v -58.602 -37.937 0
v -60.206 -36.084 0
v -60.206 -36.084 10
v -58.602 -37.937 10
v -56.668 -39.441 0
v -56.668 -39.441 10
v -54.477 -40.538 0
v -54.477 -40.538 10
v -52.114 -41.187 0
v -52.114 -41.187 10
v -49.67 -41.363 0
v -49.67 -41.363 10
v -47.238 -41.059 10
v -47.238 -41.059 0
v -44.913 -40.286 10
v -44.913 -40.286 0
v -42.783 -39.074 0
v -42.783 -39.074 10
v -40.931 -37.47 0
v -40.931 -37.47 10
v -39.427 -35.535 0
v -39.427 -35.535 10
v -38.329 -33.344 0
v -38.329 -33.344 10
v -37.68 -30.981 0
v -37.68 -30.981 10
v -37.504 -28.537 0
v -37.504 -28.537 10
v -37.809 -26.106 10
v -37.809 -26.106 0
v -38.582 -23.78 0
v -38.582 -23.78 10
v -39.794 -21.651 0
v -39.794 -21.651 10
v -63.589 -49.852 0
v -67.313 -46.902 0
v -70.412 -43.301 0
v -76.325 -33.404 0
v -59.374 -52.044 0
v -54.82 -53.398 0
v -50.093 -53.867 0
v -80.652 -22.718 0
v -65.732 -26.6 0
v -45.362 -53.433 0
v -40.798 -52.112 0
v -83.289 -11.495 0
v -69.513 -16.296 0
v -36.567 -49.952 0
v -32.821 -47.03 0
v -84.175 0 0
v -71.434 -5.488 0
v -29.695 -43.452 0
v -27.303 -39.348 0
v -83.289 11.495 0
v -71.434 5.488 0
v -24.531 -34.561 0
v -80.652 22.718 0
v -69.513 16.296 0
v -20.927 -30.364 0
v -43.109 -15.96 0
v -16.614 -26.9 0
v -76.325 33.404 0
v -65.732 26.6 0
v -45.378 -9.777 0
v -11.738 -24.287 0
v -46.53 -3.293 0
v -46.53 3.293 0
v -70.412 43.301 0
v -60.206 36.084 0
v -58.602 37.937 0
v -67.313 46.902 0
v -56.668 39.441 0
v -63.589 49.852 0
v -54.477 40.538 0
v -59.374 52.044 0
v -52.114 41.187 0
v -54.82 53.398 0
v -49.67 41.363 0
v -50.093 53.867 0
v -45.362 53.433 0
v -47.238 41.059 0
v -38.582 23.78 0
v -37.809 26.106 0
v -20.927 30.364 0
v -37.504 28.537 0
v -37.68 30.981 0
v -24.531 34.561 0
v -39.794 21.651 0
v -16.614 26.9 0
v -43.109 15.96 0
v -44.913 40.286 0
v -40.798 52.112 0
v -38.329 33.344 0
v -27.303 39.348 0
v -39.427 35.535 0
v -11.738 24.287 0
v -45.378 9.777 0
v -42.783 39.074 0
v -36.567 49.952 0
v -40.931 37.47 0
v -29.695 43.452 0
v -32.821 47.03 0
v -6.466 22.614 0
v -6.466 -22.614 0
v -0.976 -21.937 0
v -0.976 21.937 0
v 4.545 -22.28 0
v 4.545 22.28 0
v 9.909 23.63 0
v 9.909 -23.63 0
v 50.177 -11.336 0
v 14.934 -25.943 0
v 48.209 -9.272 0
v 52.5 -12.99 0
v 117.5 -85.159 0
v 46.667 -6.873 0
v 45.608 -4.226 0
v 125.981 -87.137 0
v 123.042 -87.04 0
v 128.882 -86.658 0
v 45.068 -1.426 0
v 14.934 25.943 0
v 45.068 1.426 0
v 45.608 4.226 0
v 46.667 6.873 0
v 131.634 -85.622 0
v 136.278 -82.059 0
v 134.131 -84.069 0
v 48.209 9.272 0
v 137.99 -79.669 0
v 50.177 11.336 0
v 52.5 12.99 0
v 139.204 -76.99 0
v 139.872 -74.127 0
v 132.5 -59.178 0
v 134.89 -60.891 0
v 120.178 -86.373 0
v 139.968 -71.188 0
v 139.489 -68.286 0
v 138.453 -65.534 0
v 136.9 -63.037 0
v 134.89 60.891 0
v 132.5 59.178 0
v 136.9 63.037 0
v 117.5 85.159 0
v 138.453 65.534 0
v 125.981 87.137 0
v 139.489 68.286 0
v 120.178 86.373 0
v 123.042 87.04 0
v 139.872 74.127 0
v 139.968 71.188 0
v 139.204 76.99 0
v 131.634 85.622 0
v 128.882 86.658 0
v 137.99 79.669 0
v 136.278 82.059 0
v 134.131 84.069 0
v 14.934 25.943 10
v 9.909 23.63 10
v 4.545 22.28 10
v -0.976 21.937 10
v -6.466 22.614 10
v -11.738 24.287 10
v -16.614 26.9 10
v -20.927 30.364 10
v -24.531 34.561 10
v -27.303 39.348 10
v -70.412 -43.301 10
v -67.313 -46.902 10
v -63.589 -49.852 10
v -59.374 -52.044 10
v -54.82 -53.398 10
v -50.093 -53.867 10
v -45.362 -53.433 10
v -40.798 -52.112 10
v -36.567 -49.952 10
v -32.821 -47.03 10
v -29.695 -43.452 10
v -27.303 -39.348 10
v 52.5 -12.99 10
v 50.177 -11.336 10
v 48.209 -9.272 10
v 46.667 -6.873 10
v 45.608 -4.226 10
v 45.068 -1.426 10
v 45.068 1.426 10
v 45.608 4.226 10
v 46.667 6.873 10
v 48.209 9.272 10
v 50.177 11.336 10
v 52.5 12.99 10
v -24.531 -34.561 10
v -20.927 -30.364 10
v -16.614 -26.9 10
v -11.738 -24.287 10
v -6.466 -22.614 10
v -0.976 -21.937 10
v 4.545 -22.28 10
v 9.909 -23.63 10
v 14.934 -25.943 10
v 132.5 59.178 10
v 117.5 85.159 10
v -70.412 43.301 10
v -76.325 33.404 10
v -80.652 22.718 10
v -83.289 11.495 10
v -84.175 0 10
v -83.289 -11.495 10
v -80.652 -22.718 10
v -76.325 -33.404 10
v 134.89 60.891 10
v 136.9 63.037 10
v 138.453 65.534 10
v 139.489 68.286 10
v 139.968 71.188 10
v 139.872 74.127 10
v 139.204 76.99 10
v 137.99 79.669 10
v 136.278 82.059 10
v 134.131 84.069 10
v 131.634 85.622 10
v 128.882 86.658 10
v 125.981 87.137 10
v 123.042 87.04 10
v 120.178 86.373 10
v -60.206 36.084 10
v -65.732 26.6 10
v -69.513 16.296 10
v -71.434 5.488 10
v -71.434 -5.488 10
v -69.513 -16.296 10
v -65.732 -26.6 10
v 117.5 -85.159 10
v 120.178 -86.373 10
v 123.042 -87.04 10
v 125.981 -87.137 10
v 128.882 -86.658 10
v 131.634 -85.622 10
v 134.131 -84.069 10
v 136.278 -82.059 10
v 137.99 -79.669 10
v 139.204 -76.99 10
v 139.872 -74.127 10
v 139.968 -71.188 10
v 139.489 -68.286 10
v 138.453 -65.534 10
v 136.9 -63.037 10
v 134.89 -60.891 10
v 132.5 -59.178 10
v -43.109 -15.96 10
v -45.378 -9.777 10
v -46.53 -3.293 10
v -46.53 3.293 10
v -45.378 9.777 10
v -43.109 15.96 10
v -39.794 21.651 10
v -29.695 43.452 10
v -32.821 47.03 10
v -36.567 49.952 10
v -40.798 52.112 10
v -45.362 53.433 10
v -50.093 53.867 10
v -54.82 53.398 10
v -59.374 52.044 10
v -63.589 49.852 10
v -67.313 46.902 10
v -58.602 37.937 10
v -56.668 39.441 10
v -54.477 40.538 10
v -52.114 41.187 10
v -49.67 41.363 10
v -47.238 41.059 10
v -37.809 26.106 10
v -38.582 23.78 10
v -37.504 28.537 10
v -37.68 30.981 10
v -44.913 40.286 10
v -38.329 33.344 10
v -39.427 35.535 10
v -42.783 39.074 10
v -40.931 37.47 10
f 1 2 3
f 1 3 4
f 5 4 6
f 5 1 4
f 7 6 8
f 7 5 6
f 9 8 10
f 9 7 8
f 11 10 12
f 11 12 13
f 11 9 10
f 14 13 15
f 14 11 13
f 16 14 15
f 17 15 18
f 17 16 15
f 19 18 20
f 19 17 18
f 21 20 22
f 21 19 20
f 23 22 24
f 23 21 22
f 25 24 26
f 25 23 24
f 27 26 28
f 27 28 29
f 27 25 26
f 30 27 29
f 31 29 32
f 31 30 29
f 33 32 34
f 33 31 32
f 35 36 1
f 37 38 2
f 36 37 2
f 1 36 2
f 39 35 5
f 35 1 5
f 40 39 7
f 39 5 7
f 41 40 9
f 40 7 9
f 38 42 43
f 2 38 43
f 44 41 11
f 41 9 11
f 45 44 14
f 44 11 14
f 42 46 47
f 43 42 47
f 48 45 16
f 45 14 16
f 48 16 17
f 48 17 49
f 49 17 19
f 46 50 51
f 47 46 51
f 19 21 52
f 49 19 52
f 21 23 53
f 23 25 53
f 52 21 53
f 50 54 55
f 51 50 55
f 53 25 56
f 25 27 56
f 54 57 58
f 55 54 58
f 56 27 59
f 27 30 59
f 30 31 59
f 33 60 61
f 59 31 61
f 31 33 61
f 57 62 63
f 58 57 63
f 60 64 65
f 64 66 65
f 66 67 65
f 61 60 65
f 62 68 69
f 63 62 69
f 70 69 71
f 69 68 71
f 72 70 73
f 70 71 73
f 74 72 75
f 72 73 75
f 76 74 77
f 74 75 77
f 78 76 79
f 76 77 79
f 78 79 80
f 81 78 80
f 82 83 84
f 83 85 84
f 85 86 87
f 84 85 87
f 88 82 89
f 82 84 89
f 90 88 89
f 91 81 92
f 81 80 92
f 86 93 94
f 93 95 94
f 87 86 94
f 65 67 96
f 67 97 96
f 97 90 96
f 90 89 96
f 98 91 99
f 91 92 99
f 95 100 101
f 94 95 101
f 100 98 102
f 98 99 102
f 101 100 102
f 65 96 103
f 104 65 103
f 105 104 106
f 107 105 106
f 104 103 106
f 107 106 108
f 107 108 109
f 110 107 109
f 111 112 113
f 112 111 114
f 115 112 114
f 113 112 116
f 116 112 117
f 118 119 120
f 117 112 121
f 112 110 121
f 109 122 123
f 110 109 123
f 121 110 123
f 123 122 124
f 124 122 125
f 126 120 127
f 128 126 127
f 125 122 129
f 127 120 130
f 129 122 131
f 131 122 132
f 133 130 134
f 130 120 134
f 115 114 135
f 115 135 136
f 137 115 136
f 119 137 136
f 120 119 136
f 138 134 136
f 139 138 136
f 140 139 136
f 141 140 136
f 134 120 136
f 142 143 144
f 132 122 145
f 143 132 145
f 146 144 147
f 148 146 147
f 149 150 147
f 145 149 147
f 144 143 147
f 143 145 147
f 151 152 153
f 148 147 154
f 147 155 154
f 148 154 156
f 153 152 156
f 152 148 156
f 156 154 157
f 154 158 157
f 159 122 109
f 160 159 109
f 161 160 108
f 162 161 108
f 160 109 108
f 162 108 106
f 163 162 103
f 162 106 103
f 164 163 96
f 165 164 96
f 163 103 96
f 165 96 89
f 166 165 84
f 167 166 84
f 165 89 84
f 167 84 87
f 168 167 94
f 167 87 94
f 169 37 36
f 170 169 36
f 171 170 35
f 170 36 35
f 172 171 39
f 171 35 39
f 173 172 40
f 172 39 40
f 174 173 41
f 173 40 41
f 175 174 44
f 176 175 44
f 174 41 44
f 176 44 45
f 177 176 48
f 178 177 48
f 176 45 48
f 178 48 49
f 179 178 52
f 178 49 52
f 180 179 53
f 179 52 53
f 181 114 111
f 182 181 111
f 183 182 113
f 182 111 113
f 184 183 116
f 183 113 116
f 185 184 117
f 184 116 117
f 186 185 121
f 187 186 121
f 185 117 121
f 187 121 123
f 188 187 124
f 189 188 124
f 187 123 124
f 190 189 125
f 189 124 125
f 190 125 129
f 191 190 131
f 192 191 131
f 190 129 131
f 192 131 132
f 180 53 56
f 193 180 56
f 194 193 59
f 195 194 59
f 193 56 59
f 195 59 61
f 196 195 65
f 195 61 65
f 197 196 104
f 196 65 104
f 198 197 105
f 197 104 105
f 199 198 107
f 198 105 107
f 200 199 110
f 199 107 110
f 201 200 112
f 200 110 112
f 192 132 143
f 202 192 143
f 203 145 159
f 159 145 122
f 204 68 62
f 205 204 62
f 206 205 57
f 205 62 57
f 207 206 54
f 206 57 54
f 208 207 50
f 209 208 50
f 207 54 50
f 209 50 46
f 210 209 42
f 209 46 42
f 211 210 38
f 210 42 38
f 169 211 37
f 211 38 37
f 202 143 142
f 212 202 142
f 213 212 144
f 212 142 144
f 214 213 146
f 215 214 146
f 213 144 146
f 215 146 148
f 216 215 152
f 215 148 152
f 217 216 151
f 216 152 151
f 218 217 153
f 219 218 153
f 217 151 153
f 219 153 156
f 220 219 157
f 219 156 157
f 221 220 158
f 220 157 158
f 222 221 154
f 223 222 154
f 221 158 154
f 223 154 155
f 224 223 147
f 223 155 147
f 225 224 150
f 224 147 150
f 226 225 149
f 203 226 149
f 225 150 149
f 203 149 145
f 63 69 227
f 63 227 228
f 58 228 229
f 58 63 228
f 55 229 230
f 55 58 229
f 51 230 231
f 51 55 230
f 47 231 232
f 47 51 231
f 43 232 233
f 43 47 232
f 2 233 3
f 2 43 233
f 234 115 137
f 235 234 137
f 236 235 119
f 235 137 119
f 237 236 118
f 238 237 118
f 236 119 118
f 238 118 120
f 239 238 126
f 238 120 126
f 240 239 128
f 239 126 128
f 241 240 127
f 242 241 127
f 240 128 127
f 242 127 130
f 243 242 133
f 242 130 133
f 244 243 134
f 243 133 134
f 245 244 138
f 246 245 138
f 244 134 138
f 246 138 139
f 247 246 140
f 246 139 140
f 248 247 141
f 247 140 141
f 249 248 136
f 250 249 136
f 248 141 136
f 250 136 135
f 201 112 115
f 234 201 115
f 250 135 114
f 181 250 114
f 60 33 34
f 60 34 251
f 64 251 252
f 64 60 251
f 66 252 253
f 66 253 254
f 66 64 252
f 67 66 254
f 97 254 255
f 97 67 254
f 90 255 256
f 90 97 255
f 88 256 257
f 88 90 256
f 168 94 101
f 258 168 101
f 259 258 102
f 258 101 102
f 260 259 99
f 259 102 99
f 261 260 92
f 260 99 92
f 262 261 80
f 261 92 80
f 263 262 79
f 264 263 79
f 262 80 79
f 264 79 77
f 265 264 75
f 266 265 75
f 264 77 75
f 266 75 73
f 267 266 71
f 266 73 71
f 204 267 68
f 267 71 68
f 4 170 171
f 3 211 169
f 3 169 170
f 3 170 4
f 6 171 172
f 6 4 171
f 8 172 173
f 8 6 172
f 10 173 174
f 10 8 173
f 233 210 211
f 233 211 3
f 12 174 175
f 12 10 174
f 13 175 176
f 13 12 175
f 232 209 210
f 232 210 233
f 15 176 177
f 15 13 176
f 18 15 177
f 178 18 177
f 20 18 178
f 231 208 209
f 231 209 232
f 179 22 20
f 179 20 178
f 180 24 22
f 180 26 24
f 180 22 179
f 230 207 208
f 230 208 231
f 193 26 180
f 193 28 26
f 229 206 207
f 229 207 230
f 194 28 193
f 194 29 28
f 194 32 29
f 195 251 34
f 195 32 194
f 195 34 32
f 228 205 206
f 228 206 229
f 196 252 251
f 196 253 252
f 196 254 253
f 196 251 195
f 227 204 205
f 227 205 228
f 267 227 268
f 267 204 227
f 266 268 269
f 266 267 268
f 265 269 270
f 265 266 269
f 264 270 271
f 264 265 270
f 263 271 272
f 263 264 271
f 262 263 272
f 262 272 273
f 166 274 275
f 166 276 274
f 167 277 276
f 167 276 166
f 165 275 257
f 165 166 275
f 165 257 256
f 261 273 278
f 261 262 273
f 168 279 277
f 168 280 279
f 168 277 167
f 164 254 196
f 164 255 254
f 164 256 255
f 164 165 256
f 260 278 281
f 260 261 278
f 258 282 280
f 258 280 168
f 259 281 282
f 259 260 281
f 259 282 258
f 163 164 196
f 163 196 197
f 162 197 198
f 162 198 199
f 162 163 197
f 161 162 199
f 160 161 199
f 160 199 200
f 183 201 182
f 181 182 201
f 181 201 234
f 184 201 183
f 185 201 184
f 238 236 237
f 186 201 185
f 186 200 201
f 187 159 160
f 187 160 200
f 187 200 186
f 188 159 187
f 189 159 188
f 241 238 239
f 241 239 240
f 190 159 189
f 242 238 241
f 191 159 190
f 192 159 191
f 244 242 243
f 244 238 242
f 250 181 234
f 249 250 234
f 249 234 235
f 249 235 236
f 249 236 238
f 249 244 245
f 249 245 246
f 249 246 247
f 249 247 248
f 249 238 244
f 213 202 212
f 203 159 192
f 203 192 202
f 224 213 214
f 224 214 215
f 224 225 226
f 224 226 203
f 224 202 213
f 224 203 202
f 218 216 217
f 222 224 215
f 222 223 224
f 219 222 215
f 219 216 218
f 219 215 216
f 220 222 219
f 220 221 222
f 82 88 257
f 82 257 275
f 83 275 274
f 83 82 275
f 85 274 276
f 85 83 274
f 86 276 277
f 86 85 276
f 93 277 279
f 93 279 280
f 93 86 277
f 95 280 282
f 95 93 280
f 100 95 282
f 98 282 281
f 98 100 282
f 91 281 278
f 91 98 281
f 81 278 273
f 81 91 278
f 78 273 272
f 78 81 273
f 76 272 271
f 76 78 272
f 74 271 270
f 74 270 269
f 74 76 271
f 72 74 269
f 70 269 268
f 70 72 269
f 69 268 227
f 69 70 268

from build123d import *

# Parameters (mm, degrees)
SALIENTE_EXTRUIR2_DEPTH = 10


with BuildPart() as part:
    # Croquis1 → Saliente-Extruir2 (new body)
    with BuildSketch(Plane.XY):
        with BuildLine():
            Line((117.5, 85.159164705), (14.934164903, 25.942752202))
            ThreePointArc((14.934164903, 25.942752202), (-9.140901633, 23.329053884), (-27.302652317, 39.347513849))
            ThreePointArc((-27.302652317, 39.347513849), (-47.71673979, 53.763029578), (-70.412414523, 43.301270189))
            ThreePointArc((-70.412414523, 43.301270189), (-84.175170954, 0), (-70.412414523, -43.301270189))
            ThreePointArc((-70.412414523, -43.301270189), (-47.71673979, -53.763029578), (-27.302652317, -39.347513849))
            ThreePointArc((-27.302652317, -39.347513849), (-9.140901633, -23.329053884), (14.934164903, -25.942752202))
            Line((14.934164903, -25.942752202), (117.5, -85.159164705))
            ThreePointArc((117.5, -85.159164705), (137.990381057, -79.668783649), (132.5, -59.178402592))
            Line((132.5, -59.178402592), (52.5, -12.990381057))
            ThreePointArc((52.5, -12.990381057), (45, 0), (52.5, 12.990381057))
            Line((52.5, 12.990381057), (132.5, 59.178402592))
            ThreePointArc((132.5, 59.178402592), (137.990381057, 79.668783649), (117.5, 85.159164705))
        make_face()
        with BuildLine():
            ThreePointArc((-60.206207262, 36.084391824), (-71.675170954, 0), (-60.206207262, -36.084391824))
            ThreePointArc((-60.206207262, -36.084391824), (-42.783121635, -39.073720721), (-39.793792738, -21.650635095))
            ThreePointArc((-39.793792738, -21.650635095), (-46.675170954, 0), (-39.793792738, 21.650635095))
            ThreePointArc((-39.793792738, 21.650635095), (-42.783121635, 39.073720721), (-60.206207262, 36.084391824))
        make_face(mode=Mode.SUBTRACT)
    extrude(amount=SALIENTE_EXTRUIR2_DEPTH)


solid = part.part
